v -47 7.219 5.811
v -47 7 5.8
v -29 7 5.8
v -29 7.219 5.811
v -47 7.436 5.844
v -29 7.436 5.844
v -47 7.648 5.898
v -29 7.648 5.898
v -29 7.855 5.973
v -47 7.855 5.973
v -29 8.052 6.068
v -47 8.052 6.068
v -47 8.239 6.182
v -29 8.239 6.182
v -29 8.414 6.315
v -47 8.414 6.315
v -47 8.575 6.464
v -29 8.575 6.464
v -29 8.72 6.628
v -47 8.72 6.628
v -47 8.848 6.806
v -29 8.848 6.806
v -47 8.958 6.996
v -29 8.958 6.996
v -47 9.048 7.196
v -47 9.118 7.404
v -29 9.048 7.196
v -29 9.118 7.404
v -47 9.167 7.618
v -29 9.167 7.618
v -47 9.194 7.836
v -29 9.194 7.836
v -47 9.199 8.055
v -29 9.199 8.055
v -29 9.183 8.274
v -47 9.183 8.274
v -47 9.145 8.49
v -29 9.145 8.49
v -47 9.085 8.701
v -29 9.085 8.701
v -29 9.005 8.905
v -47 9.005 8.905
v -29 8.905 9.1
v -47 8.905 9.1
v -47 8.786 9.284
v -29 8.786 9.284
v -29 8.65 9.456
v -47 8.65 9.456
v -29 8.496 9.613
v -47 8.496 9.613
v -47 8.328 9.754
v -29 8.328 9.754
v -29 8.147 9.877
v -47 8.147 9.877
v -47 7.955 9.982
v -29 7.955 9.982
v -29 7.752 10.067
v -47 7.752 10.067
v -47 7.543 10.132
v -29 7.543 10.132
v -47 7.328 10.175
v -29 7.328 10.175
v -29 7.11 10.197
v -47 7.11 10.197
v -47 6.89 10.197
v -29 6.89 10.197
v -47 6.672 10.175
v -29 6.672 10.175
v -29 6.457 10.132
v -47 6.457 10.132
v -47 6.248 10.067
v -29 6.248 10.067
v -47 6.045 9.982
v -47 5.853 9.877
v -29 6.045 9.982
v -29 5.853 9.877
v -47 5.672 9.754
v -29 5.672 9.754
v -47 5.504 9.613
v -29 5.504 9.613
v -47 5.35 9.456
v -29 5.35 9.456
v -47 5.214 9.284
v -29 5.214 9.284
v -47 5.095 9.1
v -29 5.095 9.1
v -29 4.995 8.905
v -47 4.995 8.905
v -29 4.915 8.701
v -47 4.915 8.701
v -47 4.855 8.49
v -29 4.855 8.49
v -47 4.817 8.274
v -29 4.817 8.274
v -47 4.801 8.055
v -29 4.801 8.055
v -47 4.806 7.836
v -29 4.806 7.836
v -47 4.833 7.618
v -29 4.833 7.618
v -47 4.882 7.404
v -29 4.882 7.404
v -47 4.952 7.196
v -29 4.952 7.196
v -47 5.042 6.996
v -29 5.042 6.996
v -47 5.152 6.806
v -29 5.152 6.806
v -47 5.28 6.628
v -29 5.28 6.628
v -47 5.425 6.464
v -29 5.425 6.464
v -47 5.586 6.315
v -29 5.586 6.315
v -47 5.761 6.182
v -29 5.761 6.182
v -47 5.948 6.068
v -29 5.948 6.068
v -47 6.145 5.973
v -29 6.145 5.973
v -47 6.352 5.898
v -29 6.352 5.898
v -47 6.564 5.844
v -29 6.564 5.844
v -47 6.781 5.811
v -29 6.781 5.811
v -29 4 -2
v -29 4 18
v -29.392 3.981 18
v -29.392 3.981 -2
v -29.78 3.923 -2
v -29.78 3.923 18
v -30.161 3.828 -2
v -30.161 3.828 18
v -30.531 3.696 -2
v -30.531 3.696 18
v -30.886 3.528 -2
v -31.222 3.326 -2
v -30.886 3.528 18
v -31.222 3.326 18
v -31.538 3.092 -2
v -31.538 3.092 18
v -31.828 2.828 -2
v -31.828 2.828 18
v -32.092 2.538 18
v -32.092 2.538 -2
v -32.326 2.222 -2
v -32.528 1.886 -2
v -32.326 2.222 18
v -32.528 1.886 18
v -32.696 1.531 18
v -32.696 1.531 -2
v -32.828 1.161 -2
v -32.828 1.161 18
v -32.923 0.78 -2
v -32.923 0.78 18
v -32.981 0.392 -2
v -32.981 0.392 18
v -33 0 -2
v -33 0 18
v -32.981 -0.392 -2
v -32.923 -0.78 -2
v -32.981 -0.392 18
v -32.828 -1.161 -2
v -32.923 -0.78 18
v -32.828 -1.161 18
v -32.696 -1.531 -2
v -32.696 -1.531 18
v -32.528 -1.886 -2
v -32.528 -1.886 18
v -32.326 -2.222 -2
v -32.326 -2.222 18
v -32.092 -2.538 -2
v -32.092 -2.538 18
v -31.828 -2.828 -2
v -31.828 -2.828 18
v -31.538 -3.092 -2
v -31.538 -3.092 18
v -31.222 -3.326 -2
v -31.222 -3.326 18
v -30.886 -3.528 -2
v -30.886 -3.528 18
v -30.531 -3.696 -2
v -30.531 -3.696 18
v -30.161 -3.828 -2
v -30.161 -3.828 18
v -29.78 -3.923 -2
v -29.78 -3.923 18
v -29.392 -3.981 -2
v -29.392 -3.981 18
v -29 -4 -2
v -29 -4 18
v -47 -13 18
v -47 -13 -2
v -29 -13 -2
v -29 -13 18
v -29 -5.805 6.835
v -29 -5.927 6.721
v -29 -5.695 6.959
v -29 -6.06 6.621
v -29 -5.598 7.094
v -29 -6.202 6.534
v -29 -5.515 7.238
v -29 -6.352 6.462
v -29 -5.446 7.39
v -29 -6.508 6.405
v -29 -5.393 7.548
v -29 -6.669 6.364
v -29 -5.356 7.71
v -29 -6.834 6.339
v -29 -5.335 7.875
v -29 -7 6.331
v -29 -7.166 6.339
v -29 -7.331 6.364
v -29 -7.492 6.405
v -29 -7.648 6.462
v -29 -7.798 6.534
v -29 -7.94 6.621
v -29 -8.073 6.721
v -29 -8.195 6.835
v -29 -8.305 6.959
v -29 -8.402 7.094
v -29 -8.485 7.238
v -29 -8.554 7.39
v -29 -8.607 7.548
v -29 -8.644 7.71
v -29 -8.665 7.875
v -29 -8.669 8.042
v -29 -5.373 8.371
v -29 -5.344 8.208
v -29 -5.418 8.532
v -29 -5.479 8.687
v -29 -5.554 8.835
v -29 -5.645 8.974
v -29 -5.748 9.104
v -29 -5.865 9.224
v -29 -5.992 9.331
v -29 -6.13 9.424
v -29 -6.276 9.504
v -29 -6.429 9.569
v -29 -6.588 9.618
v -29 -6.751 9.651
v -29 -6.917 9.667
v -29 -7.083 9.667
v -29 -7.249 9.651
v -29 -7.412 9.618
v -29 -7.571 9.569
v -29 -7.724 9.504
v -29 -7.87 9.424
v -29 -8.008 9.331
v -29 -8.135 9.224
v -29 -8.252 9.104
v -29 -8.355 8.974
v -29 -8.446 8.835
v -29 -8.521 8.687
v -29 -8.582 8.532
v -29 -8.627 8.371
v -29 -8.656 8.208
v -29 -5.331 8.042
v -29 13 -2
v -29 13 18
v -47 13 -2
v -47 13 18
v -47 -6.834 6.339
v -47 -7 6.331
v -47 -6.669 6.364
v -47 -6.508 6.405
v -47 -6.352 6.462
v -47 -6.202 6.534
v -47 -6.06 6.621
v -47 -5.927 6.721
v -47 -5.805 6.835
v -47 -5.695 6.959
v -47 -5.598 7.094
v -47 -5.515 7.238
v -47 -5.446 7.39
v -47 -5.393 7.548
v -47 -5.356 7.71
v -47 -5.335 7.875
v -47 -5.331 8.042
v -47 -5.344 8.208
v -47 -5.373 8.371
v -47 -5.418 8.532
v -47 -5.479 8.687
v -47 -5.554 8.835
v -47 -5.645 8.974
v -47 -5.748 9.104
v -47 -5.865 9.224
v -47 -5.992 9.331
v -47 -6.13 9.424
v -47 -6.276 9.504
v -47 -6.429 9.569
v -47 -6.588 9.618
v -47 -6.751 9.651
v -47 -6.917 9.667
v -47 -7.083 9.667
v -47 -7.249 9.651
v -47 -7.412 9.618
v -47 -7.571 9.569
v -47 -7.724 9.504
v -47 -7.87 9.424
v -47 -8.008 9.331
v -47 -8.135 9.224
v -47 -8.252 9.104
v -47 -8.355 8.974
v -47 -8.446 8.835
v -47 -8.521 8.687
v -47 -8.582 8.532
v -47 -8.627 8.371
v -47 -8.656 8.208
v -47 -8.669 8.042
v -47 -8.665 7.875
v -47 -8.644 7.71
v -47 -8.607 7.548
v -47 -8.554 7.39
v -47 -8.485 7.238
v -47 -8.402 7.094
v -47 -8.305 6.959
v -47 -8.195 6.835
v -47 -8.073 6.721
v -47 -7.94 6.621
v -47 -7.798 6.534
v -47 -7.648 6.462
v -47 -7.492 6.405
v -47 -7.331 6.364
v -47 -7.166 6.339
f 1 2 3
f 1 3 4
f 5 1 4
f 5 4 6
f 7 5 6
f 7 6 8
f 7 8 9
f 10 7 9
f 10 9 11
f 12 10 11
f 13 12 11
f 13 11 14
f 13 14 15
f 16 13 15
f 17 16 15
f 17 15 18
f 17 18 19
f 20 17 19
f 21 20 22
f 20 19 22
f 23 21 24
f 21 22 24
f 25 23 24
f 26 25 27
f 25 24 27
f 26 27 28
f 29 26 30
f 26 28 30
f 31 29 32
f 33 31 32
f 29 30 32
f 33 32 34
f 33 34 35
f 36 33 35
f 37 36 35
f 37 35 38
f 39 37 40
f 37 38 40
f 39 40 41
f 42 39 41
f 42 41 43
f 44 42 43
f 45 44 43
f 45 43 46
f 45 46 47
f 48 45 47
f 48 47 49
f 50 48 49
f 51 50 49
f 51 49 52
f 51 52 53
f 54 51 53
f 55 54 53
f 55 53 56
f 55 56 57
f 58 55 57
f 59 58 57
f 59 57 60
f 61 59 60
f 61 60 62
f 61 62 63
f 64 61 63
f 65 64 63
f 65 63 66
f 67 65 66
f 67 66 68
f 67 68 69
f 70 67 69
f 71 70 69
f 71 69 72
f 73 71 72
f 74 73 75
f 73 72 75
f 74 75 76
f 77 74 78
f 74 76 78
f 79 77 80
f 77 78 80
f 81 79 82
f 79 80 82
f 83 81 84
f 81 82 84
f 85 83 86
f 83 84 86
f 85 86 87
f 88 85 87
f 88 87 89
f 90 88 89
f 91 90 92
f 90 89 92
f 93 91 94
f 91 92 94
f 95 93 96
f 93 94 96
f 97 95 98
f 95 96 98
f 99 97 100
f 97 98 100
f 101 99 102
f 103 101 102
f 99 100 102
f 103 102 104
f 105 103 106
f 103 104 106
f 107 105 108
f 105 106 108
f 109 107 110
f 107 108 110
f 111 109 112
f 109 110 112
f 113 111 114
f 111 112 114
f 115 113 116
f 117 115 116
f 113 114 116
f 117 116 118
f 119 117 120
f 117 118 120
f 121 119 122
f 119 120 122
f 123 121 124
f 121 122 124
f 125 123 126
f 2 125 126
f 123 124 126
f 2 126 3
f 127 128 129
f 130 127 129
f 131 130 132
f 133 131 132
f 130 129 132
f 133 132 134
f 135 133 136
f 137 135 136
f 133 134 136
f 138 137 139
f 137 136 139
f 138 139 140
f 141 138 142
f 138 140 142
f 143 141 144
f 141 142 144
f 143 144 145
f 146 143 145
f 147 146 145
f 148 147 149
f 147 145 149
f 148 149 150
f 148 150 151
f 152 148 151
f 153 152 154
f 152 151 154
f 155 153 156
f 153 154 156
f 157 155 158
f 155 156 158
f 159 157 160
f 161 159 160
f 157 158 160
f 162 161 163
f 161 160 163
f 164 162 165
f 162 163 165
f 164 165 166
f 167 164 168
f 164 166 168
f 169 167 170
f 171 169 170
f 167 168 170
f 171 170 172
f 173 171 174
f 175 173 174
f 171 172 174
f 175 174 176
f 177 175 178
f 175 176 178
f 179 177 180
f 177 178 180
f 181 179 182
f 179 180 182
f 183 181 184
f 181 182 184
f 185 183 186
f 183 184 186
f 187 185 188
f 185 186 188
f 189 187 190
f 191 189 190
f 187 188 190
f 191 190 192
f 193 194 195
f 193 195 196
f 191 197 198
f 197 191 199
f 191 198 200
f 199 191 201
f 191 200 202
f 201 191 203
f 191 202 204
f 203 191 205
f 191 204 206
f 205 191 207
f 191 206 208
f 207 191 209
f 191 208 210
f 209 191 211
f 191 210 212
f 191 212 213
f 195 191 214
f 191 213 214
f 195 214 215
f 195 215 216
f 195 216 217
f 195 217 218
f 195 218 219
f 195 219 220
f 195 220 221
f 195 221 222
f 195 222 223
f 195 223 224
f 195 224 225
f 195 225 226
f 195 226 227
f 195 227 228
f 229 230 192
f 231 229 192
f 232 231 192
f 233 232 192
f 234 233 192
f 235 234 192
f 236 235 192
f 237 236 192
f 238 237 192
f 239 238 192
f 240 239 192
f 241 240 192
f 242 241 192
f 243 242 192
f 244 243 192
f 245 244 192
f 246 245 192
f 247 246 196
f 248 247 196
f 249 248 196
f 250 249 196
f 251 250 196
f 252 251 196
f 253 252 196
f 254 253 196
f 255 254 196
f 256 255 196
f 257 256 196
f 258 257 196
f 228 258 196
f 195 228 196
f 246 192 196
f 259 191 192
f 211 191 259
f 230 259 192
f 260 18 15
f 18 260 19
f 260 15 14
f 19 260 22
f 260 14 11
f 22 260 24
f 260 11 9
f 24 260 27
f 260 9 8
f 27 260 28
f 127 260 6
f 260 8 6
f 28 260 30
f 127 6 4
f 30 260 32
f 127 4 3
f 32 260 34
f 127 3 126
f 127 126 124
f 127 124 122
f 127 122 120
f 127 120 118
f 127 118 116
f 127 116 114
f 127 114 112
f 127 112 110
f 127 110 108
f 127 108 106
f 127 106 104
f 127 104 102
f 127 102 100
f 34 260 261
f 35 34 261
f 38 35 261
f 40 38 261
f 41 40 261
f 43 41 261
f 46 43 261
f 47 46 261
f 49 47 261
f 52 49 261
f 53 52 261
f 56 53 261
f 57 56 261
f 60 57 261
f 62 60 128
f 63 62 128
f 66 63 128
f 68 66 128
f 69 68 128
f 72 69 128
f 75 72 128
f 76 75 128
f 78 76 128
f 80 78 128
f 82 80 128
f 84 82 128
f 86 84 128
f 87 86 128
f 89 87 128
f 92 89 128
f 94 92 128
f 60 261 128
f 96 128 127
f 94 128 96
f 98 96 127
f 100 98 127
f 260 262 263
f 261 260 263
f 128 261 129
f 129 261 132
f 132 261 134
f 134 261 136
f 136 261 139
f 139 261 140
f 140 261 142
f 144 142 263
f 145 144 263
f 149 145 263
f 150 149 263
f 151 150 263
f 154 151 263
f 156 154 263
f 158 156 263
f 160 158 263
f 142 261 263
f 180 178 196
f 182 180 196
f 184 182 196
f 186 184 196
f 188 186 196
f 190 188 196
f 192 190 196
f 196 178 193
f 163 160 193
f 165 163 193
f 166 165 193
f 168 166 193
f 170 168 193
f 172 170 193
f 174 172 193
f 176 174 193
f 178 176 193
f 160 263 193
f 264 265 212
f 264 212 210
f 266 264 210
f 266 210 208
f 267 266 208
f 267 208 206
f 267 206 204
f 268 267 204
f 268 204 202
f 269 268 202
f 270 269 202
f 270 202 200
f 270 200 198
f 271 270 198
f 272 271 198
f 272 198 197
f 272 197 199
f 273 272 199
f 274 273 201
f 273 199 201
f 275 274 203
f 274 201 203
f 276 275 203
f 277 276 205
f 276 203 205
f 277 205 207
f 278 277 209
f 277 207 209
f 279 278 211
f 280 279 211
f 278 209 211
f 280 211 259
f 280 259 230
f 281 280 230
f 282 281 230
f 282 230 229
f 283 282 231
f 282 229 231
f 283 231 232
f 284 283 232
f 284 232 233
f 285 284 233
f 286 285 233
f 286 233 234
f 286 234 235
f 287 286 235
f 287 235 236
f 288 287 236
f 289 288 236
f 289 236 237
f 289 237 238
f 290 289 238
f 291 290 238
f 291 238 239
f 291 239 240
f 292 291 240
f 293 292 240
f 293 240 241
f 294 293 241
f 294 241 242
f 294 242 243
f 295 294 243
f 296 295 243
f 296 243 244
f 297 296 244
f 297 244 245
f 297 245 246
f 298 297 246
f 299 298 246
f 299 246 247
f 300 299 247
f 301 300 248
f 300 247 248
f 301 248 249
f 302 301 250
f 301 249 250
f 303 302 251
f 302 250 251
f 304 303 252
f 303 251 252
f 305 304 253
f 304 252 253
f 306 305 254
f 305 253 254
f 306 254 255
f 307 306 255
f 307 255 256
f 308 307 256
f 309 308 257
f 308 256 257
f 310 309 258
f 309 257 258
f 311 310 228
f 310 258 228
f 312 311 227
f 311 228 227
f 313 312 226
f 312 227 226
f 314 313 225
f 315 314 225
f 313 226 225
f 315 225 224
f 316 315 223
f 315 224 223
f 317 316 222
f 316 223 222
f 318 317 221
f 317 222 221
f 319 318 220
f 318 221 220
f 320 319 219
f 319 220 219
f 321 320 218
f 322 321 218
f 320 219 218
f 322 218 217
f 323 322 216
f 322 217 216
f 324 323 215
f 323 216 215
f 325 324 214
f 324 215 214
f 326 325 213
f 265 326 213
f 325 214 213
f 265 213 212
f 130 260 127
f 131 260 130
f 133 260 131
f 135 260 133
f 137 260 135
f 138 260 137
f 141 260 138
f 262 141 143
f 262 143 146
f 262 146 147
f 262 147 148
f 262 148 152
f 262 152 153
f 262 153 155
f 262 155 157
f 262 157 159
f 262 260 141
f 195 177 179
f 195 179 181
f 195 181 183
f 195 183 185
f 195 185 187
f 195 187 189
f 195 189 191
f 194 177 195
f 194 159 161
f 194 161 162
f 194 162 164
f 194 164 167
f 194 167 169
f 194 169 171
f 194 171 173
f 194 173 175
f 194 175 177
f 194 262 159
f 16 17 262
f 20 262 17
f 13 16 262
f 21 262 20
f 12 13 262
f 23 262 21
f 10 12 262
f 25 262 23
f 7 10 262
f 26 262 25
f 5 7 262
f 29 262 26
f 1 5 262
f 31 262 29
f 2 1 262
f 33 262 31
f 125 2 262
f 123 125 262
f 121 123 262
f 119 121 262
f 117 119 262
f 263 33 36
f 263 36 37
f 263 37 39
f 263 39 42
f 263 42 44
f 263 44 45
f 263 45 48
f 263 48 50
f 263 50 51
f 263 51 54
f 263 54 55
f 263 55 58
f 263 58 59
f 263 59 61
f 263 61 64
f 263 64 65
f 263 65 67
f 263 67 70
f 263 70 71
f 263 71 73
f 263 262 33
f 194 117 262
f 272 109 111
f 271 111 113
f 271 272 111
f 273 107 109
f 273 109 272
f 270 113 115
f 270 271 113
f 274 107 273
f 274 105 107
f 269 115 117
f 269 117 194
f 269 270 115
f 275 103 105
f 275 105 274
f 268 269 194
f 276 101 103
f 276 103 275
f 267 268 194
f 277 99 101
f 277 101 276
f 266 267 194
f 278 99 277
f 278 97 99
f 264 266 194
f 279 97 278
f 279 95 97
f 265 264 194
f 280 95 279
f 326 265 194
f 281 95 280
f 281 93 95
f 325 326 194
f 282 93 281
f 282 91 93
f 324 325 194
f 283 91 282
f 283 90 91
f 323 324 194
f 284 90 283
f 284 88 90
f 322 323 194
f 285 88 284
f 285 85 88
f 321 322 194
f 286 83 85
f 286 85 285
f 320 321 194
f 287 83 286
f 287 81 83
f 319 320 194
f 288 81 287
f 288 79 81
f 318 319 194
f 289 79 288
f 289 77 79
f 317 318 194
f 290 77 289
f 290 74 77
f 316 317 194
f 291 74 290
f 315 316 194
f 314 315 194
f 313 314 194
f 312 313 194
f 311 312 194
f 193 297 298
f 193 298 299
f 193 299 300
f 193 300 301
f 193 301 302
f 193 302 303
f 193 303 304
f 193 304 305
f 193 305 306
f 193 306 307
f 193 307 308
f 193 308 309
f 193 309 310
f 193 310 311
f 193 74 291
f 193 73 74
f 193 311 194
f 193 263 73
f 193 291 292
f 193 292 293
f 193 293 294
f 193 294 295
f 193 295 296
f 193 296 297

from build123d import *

# Parameters (mm, degrees)
SKETCH1_W           = 26
SKETCH1_H           = 20
BOSS_EXTRUDE1_DEPTH = 18
HOLE1_D             = 4.4
HOLE2_D             = 3.33839548
HOLE3_D             = 8


with BuildPart() as part:
    # Sketch1 → Boss-Extrude1 (new body)
    with BuildSketch(Plane(origin=(-47, 0, 0), x_dir=(0, -1, 0), z_dir=(-1, 0, 0))):
        with Locations((0, 8)):
            Rectangle(SKETCH1_W, SKETCH1_H)
    extrude(amount=-BOSS_EXTRUDE1_DEPTH)

    # Hole1 (through all)
    with Locations(Plane.ZY.offset(47)):
        with Locations((8, 7)):
            Hole(HOLE1_D / 2)

    # Hole2 (through all)
    with Locations(Plane.ZY.offset(47)):
        with Locations((8, -7)):
            Hole(HOLE2_D / 2)

    # Hole3 (through all)
    with Locations(Plane(origin=(0, 0, -2), x_dir=(-1, 0, 0), z_dir=(0, 0, -1))):
        with Locations((29, 0)):
            Hole(HOLE3_D / 2)


solid = part.part
